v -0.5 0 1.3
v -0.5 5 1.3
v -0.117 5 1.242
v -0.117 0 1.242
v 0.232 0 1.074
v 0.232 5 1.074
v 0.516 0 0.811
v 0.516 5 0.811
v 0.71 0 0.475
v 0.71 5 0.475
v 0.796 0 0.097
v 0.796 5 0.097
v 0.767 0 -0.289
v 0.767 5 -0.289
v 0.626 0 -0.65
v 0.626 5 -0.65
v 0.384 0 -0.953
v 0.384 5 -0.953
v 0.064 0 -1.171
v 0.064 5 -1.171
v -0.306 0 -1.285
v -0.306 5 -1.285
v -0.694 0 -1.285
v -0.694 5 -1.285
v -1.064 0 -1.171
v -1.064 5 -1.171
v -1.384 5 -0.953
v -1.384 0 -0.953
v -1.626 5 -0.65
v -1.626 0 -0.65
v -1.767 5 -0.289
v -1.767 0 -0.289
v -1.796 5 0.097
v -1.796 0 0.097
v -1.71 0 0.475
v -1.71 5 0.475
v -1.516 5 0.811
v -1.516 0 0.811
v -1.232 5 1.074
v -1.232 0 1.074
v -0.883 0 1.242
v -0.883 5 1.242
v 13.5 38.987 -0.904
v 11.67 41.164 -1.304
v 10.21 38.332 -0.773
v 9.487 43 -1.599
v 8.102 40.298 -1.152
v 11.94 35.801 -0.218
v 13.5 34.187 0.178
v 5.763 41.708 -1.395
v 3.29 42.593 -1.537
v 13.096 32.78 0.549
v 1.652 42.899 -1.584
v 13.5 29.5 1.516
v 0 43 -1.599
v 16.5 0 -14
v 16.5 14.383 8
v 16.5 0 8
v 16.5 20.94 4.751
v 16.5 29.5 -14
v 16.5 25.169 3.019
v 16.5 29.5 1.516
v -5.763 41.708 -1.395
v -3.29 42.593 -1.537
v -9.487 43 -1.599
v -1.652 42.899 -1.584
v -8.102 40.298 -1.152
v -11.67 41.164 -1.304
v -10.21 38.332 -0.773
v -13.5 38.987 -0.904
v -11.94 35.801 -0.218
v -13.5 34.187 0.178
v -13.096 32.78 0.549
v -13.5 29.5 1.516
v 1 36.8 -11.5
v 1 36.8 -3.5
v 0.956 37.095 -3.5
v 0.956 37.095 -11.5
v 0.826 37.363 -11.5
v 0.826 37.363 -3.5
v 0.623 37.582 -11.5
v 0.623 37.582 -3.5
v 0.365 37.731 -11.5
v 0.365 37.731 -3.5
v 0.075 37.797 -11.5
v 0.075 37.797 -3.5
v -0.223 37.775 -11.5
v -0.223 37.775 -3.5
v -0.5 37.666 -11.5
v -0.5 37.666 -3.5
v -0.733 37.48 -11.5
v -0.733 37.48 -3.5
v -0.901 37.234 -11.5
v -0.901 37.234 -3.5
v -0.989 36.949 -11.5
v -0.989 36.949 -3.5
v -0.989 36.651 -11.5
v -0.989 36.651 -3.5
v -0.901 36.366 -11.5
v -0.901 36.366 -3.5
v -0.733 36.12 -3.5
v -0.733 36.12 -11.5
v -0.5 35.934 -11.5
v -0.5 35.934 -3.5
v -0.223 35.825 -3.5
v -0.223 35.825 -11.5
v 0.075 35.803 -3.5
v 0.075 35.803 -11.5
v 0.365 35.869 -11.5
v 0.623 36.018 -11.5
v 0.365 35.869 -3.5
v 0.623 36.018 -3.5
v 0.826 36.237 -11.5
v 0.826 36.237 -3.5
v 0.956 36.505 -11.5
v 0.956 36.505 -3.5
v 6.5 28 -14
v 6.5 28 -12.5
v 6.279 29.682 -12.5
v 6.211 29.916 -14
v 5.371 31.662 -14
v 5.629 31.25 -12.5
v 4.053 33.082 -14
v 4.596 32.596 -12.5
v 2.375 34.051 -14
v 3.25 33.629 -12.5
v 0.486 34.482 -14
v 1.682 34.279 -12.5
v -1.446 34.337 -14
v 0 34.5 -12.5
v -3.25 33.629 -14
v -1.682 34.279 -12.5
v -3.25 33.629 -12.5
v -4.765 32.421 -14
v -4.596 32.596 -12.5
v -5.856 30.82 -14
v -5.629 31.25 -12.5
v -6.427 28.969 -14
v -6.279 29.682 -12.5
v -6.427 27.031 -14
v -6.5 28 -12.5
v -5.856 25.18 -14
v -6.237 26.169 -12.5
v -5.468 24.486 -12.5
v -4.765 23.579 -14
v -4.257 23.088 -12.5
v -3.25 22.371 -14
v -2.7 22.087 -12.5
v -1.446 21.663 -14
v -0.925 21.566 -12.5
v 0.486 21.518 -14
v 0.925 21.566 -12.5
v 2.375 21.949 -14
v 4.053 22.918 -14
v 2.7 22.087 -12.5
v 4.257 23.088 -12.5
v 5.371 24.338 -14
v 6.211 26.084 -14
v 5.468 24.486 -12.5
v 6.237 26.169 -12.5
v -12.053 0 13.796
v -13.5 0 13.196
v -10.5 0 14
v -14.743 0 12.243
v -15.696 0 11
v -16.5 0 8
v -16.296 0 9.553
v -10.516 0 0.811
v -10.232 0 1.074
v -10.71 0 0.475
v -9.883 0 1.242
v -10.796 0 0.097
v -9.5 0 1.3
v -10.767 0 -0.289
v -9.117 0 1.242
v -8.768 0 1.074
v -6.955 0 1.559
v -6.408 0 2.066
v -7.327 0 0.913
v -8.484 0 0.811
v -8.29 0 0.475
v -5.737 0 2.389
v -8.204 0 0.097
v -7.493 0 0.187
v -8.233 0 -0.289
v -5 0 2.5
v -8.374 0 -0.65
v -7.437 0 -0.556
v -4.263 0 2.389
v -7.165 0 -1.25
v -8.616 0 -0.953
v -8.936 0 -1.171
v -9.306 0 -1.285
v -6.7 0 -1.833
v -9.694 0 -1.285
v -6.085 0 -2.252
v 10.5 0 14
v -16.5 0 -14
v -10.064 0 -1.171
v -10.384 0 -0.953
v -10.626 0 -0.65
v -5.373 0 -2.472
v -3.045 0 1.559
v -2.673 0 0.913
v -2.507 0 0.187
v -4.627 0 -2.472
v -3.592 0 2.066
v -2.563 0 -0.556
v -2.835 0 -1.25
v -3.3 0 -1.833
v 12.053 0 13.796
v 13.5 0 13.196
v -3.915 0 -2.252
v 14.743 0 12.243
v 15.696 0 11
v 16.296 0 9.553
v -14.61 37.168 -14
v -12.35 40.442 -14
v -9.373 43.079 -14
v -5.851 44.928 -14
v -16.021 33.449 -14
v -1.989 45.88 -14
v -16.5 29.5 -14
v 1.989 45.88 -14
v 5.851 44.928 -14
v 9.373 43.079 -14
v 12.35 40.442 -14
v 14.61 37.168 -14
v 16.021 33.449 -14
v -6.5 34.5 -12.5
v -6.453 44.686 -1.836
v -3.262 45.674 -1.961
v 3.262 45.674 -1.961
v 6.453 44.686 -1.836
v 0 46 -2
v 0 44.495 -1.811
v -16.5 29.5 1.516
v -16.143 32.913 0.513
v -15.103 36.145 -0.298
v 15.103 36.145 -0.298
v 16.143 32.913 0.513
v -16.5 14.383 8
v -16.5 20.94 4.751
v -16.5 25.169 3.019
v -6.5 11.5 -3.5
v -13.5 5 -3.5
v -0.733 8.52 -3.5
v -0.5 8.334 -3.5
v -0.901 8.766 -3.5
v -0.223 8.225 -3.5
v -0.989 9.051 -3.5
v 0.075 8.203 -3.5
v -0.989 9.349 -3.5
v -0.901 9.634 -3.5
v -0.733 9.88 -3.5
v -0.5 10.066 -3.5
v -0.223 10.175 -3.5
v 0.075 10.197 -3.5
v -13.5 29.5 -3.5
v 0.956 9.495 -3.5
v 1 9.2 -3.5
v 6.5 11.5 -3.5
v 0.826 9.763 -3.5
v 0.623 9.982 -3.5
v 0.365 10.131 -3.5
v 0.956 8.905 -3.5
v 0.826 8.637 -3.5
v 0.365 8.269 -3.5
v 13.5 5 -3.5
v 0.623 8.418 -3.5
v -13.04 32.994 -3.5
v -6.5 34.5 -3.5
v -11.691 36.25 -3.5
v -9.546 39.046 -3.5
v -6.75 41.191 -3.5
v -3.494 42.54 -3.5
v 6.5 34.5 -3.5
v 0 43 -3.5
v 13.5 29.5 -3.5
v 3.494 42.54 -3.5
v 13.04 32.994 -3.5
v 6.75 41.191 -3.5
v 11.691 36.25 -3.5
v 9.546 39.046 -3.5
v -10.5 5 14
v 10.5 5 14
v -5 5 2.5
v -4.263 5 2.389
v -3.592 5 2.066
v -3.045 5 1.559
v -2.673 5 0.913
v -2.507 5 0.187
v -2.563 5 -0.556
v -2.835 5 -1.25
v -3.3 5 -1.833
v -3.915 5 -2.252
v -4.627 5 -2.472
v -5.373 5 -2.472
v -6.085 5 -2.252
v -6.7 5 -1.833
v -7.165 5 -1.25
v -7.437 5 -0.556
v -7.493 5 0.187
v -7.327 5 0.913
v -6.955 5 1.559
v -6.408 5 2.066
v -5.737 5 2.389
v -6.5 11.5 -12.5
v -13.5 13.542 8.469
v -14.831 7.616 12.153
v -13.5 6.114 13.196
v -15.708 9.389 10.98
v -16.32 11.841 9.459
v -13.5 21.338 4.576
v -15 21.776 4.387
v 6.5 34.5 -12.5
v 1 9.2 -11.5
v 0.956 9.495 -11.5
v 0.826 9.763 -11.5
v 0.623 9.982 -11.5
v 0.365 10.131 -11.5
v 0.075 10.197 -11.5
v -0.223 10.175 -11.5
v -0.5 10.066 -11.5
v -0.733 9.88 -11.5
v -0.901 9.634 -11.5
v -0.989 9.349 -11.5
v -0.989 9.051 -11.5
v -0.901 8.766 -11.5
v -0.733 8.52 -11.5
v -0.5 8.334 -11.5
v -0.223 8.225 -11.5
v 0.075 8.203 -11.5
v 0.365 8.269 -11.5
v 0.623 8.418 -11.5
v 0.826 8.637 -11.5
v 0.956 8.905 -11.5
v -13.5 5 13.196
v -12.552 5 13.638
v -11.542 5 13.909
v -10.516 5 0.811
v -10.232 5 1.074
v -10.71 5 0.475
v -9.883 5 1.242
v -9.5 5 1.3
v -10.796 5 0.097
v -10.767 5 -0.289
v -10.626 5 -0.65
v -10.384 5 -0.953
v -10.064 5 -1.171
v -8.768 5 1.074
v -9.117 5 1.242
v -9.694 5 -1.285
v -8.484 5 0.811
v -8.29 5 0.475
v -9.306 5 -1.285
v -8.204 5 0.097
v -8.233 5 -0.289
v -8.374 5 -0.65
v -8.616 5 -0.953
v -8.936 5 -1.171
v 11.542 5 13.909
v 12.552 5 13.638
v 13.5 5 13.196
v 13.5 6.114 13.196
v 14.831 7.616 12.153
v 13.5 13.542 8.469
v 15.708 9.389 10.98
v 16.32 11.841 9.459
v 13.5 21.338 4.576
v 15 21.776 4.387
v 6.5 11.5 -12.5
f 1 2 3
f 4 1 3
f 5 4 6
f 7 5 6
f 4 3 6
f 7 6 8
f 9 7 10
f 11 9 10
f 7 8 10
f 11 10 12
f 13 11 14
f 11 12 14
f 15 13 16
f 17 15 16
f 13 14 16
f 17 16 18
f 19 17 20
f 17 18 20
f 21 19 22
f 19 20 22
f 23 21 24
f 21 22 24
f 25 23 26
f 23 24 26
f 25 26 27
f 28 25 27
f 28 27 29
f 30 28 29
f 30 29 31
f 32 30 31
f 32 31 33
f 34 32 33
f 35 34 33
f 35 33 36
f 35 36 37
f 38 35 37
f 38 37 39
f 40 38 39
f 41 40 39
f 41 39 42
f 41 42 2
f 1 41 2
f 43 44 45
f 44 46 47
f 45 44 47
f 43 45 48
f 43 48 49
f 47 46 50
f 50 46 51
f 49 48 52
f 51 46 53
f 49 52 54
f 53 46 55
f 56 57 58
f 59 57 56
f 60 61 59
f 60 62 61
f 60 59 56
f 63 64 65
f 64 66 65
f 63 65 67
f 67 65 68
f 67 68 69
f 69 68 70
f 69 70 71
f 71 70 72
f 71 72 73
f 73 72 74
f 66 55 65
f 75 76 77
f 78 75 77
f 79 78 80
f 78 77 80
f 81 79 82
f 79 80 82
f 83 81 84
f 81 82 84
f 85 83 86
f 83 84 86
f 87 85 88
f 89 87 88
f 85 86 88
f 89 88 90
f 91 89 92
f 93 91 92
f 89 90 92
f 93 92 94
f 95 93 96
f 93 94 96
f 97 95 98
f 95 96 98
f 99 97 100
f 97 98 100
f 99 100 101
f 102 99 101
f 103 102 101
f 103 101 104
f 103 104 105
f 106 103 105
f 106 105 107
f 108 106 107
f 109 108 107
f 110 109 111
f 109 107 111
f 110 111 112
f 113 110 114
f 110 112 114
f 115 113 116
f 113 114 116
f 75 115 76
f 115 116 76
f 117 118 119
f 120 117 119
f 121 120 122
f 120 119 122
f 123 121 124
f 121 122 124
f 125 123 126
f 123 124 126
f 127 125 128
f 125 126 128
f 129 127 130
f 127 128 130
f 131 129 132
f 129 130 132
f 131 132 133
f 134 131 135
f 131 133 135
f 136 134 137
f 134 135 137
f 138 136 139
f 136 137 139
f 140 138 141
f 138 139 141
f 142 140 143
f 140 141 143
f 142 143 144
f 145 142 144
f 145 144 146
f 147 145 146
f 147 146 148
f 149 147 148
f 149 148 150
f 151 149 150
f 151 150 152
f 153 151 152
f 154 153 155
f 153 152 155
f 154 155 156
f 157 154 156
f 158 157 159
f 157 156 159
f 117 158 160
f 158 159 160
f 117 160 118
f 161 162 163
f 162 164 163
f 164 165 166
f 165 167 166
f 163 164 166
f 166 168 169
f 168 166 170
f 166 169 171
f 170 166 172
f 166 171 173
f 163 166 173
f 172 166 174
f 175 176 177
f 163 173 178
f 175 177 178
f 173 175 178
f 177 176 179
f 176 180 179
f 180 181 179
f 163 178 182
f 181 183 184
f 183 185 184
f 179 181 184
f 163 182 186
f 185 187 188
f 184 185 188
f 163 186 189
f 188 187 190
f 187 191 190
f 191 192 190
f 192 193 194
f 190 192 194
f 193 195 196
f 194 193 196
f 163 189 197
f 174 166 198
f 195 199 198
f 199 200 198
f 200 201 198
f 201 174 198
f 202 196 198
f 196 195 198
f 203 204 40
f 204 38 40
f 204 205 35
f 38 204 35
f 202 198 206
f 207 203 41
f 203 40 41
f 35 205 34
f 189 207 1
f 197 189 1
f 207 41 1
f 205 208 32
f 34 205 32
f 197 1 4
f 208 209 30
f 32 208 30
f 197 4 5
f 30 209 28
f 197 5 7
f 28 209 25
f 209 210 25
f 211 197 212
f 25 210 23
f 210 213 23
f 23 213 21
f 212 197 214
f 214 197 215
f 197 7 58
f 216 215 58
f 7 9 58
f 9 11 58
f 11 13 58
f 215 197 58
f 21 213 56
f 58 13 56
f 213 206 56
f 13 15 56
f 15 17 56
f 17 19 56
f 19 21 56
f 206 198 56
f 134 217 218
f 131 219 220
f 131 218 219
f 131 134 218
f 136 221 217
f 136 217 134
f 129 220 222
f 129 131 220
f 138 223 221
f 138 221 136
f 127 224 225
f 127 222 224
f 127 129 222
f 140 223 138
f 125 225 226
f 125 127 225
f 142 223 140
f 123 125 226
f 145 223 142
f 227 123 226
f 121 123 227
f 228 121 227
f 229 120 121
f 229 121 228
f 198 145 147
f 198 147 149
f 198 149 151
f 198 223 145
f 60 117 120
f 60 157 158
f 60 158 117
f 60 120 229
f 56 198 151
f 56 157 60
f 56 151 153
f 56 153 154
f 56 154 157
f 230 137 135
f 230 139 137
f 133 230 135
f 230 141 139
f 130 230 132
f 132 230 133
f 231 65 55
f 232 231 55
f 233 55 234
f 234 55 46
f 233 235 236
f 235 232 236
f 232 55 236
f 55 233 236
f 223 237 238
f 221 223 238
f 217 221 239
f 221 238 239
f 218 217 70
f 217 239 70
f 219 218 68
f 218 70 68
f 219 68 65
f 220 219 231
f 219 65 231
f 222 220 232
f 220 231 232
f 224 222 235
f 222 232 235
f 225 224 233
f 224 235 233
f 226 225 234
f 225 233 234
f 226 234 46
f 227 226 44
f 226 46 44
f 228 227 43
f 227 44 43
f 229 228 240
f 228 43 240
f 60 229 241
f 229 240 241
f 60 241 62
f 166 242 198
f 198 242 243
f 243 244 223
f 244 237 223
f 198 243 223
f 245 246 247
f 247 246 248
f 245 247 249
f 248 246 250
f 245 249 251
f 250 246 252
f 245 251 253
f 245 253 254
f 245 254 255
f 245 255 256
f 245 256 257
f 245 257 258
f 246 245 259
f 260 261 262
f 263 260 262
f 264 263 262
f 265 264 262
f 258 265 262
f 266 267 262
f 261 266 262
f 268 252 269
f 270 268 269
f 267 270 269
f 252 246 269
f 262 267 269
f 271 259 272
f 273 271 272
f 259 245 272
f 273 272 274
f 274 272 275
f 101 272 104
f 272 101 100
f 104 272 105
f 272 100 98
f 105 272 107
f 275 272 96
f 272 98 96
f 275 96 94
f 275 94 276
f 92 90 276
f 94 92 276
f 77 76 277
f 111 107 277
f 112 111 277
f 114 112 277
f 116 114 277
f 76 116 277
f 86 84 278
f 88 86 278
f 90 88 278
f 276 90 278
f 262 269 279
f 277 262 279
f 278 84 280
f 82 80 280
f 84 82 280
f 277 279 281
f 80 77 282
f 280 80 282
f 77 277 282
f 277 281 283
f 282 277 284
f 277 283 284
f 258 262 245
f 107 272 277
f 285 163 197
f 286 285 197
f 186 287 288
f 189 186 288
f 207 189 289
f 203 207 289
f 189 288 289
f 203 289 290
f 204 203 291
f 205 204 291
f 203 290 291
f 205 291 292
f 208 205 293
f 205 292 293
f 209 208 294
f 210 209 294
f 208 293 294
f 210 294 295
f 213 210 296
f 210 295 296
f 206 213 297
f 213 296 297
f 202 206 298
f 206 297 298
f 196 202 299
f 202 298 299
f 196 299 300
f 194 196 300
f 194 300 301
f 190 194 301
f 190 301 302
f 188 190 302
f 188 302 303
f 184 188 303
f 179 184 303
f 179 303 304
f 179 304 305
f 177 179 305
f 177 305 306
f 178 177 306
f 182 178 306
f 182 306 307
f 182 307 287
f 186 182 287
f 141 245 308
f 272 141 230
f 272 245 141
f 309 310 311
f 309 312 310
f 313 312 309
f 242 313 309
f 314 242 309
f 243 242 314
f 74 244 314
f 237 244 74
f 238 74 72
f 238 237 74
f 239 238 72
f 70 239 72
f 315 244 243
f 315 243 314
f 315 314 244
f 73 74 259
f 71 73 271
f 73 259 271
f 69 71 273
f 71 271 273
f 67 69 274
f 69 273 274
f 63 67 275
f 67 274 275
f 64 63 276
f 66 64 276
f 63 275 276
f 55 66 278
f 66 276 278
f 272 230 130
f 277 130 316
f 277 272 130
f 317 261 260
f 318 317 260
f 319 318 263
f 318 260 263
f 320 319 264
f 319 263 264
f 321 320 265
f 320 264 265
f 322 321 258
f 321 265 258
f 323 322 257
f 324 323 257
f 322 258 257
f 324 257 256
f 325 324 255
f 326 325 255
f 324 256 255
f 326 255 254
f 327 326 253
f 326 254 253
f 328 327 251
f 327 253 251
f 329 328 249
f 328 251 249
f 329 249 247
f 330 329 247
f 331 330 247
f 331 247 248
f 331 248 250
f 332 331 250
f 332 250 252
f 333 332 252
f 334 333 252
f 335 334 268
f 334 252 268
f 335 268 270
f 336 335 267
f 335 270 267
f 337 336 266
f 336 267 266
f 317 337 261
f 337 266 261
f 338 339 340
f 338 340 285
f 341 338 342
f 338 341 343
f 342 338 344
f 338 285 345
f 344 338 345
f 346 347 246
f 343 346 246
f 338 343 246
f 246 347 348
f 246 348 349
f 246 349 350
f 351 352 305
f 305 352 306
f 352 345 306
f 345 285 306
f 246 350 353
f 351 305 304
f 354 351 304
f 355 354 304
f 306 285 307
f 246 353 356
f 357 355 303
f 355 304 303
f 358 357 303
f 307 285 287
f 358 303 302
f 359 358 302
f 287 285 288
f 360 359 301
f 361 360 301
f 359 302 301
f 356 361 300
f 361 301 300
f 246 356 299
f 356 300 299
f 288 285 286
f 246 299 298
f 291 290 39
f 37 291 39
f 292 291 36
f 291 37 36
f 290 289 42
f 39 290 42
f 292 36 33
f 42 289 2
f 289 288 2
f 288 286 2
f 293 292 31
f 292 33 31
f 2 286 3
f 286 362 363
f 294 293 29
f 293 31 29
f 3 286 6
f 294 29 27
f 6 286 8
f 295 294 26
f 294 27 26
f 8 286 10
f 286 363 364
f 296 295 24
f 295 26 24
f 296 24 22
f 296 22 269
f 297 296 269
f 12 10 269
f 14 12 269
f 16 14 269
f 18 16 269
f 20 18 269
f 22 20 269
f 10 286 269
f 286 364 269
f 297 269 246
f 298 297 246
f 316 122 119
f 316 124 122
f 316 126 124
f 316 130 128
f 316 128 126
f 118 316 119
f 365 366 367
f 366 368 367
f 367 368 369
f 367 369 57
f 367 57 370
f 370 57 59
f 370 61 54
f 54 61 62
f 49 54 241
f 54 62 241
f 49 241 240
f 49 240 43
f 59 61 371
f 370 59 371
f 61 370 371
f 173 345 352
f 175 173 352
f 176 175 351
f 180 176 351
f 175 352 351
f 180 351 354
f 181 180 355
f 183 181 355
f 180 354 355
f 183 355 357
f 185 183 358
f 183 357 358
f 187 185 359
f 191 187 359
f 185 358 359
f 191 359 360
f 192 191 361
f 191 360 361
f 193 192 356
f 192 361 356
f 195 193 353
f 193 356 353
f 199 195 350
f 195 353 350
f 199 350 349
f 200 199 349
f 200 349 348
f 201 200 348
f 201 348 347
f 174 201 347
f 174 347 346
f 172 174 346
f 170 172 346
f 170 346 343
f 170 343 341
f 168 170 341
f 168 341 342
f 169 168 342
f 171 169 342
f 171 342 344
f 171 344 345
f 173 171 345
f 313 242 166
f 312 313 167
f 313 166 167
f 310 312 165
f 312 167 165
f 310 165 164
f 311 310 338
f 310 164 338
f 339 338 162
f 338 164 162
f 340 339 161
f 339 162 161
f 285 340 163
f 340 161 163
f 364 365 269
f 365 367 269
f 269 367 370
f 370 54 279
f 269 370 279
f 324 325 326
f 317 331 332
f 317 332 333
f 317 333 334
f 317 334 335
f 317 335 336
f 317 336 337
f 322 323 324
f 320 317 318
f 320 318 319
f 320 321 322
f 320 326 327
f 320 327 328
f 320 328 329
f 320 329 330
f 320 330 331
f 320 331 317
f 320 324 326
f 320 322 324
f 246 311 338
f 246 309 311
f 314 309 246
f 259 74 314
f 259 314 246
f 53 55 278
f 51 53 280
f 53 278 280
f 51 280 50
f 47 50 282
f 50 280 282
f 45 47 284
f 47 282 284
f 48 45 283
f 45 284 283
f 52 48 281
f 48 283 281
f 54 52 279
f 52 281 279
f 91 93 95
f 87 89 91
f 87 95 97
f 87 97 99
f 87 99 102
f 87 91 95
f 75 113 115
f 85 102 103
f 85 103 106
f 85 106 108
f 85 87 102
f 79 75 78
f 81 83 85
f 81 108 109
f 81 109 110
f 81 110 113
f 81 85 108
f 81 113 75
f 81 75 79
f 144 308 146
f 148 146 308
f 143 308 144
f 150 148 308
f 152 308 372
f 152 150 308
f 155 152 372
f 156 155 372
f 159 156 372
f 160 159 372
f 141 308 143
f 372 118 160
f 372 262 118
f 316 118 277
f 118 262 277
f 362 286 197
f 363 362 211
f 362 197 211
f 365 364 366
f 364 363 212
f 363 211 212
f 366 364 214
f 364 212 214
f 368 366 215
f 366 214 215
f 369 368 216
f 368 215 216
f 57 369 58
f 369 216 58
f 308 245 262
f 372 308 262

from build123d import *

# Parameters (mm, degrees)
SKETCH1_W           = 33
SKETCH1_H           = 28
BOSS_EXTRUDE1_DEPTH = 46
SKETCH2_W           = 17.5
SKETCH2_H           = 41
CUT_EXTRUDE1_DEPTH  = 46
BOSS_EXTRUDE2_DEPTH = 3
BOSS_EXTRUDE3_DEPTH = 27
FILLET1_START       = -3.5
FILLET1_DEPTH       = 5.015993094
FILLET1_START_2     = -13.5
FILLET1_2_DEPTH     = 27
FILLET2_R           = 16.5
FILLET3_R           = 6
SKETCH5_W           = 13
SKETCH5_H           = 23
CUT_EXTRUDE4_DEPTH  = 9
SKETCH6_R           = 6.5
CUT_EXTRUDE5_DEPTH  = 9
SKETCH7_R           = 1
CUT_EXTRUDE6_DEPTH  = 8
SKETCH8_R           = 1.3
SKETCH8_R_2         = 2.5
CUT_EXTRUDE7_DEPTH  = 47.360004936


with BuildPart() as part:
    # Sketch1 → Boss-Extrude1 (new body)
    with BuildSketch(Plane(origin=(0, 0, 0), x_dir=(1, 0, 0), z_dir=(0, 1, 0))):
        Rectangle(SKETCH1_W, SKETCH1_H)
    extrude(amount=BOSS_EXTRUDE1_DEPTH)

    # Sketch2 → Cut-Extrude1 (cut)
    with BuildSketch(Plane(origin=(16.5, 0, 0), x_dir=(0, 0, -1), z_dir=(1, 0, 0))):
        with Locations((-5.25, 25.5)):
            Rectangle(SKETCH2_W, SKETCH2_H)
    extrude(amount=-CUT_EXTRUDE1_DEPTH, mode=Mode.SUBTRACT)

    # Sketch3 → Boss-Extrude2 (add)
    with BuildSketch(Plane(origin=(16.5, 0, 0), x_dir=(0, 0, -1), z_dir=(1, 0, 0))):
        with BuildLine():
            Line((3.5, 46), (2, 46))
            add(Edge.make_bspline(
                [(-14, 5), (-0.68227026, 23.158489921), (2, 46)],
                knots=[0, 0, 0, 1, 1, 1], degree=2))
            Line((-14, 5), (3.5, 5))
            Line((3.5, 5), (3.5, 46))
        make_face()
    boss_extrude2 = extrude(amount=-BOSS_EXTRUDE2_DEPTH)

    # Mirror1: Boss-Extrude2 across plane
    add(boss_extrude2.mirror(Plane(origin=(0, 0, 0), x_dir=(0, 0, 1), z_dir=(1, 0, 0))))

    # Sketch4 → Boss-Extrude3 (add)
    with BuildSketch(Plane.ZY.offset(-13.5)):
        with BuildLine():
            Line((-3.5, 46), (-3.5, 43))
            Line((-3.5, 43), (-1.598813094, 43))
            add(Edge.make_bspline(
                [(-1.598813094, 43), (-1.82265352, 44.489763885), (-2.000000005, 46.000000046)],
                knots=[0.933881948, 0.933881948, 0.933881948, 1, 1, 1], degree=2))
            Line((-2.000000005, 46.000000046), (-3.5, 46))
        make_face()
    extrude(amount=BOSS_EXTRUDE3_DEPTH)

    # Fillet1: read off the stored shape, not the designer's step
    # Fillet1 outline → Fillet1 (add)
    with BuildSketch(Plane.XY.offset(FILLET1_START)):
        with BuildLine():
            ThreePointArc((-13.5, 29.5), (-9.545941546, 39.045941546), (0, 43))
            Line((0, 43), (-13.5, 43))
            Line((-13.5, 43), (-13.5, 29.5))
        make_face()
        with BuildLine():
            ThreePointArc((0, 43), (9.545941546, 39.045941546), (13.5, 29.5))
            Line((13.5, 29.5), (13.5, 43))
            Line((13.5, 43), (0, 43))
        make_face()
    extrude(amount=FILLET1_DEPTH)

    # Fillet1 2 outline → Fillet1 2 (cut)
    with BuildSketch(Plane.YZ.offset(FILLET1_START_2)):
        with BuildLine():
            add(Edge.make_bspline(
                [(43, -1.598813094), (36.02565956, -0.550902514), (29.499999971, 1.515993003)],
                knots=[0.066118051, 0.066118051, 0.066118051, 0.375650194, 0.375650194, 0.375650194], degree=2))
            Line((43, -1.598813094), (43, 1.515993094))
            Line((43, 1.515993094), (29.499999971, 1.515993003))
        make_face()
    extrude(amount=FILLET1_2_DEPTH, mode=Mode.SUBTRACT)

    # Fillet2
    # the kernel refuses this fillet: 16.5 mm, written as the material it takes off along each edge
    with BuildSketch(Plane(origin=(16.5, 46, -55.25), x_dir=(0, -1, 0), z_dir=(0, 0, 1)), Plane(origin=(-16.5, 46, 39.25), x_dir=(0, -1, 0), z_dir=(0, 0, -1))) as fillet2_piece_1:
        with BuildLine():
            CenterArc((FILLET2_R, -FILLET2_R), FILLET2_R, 90, 90)
            Line((0, -FILLET2_R), (0, 0))
            Line((0, 0), (FILLET2_R, 0))
        make_face()
    extrude(amount=94.5, mode=Mode.SUBTRACT)

    # Fillet3
    # the kernel refuses this fillet: 6 mm, written as the material it takes off along each edge
    with BuildSketch(Plane(origin=(-16.5, -15, 14), x_dir=(1, 0, 0), z_dir=(0, 1, 0)), Plane(origin=(16.5, -15, 14), x_dir=(0, 0, -1), z_dir=(0, 1, 0))) as fillet3_piece_1:
        with BuildLine():
            CenterArc((FILLET3_R, FILLET3_R), FILLET3_R, 180, 90)
            Line((0, FILLET3_R), (0, 0))
            Line((0, 0), (FILLET3_R, 0))
        make_face()
    extrude(amount=35, mode=Mode.SUBTRACT)

    # Sketch5 → Cut-Extrude4 (cut)
    with BuildSketch(Plane.XY.offset(-3.5)):
        with Locations((0, 23)):
            Rectangle(SKETCH5_W, SKETCH5_H)
    extrude(amount=-CUT_EXTRUDE4_DEPTH, mode=Mode.SUBTRACT)

    # Sketch6 → Cut-Extrude5 (cut)
    with BuildSketch(Plane.XY.offset(-12.5)):
        with Locations((0, 28)):
            Circle(SKETCH6_R)
    extrude(amount=-CUT_EXTRUDE5_DEPTH, mode=Mode.SUBTRACT)

    # Sketch7 → Cut-Extrude6 (cut)
    with BuildSketch(Plane.XY.offset(-3.5)):
        with Locations((0, 36.8)):
            Circle(SKETCH7_R)
        with Locations((0, 9.2)):
            Circle(SKETCH7_R)
    extrude(amount=-CUT_EXTRUDE6_DEPTH, mode=Mode.SUBTRACT)

    # Sketch8 → Cut-Extrude7 (cut, through all)
    with BuildSketch(Plane(origin=(0, 5, 0), x_dir=(1, 0, 0), z_dir=(0, 1, 0))):
        with Locations(Location((-0.5, 0, 0), (0, 0, 270))):
            Circle(SKETCH8_R)
        with Locations(Location((-5, 0, 0), (0, 0, 270))):
            Circle(SKETCH8_R_2)
        with Locations(Location((-9.5, 0, 0), (0, 0, 270))):
            Circle(SKETCH8_R)
    extrude(amount=-CUT_EXTRUDE7_DEPTH, mode=Mode.SUBTRACT)


solid = part.part
